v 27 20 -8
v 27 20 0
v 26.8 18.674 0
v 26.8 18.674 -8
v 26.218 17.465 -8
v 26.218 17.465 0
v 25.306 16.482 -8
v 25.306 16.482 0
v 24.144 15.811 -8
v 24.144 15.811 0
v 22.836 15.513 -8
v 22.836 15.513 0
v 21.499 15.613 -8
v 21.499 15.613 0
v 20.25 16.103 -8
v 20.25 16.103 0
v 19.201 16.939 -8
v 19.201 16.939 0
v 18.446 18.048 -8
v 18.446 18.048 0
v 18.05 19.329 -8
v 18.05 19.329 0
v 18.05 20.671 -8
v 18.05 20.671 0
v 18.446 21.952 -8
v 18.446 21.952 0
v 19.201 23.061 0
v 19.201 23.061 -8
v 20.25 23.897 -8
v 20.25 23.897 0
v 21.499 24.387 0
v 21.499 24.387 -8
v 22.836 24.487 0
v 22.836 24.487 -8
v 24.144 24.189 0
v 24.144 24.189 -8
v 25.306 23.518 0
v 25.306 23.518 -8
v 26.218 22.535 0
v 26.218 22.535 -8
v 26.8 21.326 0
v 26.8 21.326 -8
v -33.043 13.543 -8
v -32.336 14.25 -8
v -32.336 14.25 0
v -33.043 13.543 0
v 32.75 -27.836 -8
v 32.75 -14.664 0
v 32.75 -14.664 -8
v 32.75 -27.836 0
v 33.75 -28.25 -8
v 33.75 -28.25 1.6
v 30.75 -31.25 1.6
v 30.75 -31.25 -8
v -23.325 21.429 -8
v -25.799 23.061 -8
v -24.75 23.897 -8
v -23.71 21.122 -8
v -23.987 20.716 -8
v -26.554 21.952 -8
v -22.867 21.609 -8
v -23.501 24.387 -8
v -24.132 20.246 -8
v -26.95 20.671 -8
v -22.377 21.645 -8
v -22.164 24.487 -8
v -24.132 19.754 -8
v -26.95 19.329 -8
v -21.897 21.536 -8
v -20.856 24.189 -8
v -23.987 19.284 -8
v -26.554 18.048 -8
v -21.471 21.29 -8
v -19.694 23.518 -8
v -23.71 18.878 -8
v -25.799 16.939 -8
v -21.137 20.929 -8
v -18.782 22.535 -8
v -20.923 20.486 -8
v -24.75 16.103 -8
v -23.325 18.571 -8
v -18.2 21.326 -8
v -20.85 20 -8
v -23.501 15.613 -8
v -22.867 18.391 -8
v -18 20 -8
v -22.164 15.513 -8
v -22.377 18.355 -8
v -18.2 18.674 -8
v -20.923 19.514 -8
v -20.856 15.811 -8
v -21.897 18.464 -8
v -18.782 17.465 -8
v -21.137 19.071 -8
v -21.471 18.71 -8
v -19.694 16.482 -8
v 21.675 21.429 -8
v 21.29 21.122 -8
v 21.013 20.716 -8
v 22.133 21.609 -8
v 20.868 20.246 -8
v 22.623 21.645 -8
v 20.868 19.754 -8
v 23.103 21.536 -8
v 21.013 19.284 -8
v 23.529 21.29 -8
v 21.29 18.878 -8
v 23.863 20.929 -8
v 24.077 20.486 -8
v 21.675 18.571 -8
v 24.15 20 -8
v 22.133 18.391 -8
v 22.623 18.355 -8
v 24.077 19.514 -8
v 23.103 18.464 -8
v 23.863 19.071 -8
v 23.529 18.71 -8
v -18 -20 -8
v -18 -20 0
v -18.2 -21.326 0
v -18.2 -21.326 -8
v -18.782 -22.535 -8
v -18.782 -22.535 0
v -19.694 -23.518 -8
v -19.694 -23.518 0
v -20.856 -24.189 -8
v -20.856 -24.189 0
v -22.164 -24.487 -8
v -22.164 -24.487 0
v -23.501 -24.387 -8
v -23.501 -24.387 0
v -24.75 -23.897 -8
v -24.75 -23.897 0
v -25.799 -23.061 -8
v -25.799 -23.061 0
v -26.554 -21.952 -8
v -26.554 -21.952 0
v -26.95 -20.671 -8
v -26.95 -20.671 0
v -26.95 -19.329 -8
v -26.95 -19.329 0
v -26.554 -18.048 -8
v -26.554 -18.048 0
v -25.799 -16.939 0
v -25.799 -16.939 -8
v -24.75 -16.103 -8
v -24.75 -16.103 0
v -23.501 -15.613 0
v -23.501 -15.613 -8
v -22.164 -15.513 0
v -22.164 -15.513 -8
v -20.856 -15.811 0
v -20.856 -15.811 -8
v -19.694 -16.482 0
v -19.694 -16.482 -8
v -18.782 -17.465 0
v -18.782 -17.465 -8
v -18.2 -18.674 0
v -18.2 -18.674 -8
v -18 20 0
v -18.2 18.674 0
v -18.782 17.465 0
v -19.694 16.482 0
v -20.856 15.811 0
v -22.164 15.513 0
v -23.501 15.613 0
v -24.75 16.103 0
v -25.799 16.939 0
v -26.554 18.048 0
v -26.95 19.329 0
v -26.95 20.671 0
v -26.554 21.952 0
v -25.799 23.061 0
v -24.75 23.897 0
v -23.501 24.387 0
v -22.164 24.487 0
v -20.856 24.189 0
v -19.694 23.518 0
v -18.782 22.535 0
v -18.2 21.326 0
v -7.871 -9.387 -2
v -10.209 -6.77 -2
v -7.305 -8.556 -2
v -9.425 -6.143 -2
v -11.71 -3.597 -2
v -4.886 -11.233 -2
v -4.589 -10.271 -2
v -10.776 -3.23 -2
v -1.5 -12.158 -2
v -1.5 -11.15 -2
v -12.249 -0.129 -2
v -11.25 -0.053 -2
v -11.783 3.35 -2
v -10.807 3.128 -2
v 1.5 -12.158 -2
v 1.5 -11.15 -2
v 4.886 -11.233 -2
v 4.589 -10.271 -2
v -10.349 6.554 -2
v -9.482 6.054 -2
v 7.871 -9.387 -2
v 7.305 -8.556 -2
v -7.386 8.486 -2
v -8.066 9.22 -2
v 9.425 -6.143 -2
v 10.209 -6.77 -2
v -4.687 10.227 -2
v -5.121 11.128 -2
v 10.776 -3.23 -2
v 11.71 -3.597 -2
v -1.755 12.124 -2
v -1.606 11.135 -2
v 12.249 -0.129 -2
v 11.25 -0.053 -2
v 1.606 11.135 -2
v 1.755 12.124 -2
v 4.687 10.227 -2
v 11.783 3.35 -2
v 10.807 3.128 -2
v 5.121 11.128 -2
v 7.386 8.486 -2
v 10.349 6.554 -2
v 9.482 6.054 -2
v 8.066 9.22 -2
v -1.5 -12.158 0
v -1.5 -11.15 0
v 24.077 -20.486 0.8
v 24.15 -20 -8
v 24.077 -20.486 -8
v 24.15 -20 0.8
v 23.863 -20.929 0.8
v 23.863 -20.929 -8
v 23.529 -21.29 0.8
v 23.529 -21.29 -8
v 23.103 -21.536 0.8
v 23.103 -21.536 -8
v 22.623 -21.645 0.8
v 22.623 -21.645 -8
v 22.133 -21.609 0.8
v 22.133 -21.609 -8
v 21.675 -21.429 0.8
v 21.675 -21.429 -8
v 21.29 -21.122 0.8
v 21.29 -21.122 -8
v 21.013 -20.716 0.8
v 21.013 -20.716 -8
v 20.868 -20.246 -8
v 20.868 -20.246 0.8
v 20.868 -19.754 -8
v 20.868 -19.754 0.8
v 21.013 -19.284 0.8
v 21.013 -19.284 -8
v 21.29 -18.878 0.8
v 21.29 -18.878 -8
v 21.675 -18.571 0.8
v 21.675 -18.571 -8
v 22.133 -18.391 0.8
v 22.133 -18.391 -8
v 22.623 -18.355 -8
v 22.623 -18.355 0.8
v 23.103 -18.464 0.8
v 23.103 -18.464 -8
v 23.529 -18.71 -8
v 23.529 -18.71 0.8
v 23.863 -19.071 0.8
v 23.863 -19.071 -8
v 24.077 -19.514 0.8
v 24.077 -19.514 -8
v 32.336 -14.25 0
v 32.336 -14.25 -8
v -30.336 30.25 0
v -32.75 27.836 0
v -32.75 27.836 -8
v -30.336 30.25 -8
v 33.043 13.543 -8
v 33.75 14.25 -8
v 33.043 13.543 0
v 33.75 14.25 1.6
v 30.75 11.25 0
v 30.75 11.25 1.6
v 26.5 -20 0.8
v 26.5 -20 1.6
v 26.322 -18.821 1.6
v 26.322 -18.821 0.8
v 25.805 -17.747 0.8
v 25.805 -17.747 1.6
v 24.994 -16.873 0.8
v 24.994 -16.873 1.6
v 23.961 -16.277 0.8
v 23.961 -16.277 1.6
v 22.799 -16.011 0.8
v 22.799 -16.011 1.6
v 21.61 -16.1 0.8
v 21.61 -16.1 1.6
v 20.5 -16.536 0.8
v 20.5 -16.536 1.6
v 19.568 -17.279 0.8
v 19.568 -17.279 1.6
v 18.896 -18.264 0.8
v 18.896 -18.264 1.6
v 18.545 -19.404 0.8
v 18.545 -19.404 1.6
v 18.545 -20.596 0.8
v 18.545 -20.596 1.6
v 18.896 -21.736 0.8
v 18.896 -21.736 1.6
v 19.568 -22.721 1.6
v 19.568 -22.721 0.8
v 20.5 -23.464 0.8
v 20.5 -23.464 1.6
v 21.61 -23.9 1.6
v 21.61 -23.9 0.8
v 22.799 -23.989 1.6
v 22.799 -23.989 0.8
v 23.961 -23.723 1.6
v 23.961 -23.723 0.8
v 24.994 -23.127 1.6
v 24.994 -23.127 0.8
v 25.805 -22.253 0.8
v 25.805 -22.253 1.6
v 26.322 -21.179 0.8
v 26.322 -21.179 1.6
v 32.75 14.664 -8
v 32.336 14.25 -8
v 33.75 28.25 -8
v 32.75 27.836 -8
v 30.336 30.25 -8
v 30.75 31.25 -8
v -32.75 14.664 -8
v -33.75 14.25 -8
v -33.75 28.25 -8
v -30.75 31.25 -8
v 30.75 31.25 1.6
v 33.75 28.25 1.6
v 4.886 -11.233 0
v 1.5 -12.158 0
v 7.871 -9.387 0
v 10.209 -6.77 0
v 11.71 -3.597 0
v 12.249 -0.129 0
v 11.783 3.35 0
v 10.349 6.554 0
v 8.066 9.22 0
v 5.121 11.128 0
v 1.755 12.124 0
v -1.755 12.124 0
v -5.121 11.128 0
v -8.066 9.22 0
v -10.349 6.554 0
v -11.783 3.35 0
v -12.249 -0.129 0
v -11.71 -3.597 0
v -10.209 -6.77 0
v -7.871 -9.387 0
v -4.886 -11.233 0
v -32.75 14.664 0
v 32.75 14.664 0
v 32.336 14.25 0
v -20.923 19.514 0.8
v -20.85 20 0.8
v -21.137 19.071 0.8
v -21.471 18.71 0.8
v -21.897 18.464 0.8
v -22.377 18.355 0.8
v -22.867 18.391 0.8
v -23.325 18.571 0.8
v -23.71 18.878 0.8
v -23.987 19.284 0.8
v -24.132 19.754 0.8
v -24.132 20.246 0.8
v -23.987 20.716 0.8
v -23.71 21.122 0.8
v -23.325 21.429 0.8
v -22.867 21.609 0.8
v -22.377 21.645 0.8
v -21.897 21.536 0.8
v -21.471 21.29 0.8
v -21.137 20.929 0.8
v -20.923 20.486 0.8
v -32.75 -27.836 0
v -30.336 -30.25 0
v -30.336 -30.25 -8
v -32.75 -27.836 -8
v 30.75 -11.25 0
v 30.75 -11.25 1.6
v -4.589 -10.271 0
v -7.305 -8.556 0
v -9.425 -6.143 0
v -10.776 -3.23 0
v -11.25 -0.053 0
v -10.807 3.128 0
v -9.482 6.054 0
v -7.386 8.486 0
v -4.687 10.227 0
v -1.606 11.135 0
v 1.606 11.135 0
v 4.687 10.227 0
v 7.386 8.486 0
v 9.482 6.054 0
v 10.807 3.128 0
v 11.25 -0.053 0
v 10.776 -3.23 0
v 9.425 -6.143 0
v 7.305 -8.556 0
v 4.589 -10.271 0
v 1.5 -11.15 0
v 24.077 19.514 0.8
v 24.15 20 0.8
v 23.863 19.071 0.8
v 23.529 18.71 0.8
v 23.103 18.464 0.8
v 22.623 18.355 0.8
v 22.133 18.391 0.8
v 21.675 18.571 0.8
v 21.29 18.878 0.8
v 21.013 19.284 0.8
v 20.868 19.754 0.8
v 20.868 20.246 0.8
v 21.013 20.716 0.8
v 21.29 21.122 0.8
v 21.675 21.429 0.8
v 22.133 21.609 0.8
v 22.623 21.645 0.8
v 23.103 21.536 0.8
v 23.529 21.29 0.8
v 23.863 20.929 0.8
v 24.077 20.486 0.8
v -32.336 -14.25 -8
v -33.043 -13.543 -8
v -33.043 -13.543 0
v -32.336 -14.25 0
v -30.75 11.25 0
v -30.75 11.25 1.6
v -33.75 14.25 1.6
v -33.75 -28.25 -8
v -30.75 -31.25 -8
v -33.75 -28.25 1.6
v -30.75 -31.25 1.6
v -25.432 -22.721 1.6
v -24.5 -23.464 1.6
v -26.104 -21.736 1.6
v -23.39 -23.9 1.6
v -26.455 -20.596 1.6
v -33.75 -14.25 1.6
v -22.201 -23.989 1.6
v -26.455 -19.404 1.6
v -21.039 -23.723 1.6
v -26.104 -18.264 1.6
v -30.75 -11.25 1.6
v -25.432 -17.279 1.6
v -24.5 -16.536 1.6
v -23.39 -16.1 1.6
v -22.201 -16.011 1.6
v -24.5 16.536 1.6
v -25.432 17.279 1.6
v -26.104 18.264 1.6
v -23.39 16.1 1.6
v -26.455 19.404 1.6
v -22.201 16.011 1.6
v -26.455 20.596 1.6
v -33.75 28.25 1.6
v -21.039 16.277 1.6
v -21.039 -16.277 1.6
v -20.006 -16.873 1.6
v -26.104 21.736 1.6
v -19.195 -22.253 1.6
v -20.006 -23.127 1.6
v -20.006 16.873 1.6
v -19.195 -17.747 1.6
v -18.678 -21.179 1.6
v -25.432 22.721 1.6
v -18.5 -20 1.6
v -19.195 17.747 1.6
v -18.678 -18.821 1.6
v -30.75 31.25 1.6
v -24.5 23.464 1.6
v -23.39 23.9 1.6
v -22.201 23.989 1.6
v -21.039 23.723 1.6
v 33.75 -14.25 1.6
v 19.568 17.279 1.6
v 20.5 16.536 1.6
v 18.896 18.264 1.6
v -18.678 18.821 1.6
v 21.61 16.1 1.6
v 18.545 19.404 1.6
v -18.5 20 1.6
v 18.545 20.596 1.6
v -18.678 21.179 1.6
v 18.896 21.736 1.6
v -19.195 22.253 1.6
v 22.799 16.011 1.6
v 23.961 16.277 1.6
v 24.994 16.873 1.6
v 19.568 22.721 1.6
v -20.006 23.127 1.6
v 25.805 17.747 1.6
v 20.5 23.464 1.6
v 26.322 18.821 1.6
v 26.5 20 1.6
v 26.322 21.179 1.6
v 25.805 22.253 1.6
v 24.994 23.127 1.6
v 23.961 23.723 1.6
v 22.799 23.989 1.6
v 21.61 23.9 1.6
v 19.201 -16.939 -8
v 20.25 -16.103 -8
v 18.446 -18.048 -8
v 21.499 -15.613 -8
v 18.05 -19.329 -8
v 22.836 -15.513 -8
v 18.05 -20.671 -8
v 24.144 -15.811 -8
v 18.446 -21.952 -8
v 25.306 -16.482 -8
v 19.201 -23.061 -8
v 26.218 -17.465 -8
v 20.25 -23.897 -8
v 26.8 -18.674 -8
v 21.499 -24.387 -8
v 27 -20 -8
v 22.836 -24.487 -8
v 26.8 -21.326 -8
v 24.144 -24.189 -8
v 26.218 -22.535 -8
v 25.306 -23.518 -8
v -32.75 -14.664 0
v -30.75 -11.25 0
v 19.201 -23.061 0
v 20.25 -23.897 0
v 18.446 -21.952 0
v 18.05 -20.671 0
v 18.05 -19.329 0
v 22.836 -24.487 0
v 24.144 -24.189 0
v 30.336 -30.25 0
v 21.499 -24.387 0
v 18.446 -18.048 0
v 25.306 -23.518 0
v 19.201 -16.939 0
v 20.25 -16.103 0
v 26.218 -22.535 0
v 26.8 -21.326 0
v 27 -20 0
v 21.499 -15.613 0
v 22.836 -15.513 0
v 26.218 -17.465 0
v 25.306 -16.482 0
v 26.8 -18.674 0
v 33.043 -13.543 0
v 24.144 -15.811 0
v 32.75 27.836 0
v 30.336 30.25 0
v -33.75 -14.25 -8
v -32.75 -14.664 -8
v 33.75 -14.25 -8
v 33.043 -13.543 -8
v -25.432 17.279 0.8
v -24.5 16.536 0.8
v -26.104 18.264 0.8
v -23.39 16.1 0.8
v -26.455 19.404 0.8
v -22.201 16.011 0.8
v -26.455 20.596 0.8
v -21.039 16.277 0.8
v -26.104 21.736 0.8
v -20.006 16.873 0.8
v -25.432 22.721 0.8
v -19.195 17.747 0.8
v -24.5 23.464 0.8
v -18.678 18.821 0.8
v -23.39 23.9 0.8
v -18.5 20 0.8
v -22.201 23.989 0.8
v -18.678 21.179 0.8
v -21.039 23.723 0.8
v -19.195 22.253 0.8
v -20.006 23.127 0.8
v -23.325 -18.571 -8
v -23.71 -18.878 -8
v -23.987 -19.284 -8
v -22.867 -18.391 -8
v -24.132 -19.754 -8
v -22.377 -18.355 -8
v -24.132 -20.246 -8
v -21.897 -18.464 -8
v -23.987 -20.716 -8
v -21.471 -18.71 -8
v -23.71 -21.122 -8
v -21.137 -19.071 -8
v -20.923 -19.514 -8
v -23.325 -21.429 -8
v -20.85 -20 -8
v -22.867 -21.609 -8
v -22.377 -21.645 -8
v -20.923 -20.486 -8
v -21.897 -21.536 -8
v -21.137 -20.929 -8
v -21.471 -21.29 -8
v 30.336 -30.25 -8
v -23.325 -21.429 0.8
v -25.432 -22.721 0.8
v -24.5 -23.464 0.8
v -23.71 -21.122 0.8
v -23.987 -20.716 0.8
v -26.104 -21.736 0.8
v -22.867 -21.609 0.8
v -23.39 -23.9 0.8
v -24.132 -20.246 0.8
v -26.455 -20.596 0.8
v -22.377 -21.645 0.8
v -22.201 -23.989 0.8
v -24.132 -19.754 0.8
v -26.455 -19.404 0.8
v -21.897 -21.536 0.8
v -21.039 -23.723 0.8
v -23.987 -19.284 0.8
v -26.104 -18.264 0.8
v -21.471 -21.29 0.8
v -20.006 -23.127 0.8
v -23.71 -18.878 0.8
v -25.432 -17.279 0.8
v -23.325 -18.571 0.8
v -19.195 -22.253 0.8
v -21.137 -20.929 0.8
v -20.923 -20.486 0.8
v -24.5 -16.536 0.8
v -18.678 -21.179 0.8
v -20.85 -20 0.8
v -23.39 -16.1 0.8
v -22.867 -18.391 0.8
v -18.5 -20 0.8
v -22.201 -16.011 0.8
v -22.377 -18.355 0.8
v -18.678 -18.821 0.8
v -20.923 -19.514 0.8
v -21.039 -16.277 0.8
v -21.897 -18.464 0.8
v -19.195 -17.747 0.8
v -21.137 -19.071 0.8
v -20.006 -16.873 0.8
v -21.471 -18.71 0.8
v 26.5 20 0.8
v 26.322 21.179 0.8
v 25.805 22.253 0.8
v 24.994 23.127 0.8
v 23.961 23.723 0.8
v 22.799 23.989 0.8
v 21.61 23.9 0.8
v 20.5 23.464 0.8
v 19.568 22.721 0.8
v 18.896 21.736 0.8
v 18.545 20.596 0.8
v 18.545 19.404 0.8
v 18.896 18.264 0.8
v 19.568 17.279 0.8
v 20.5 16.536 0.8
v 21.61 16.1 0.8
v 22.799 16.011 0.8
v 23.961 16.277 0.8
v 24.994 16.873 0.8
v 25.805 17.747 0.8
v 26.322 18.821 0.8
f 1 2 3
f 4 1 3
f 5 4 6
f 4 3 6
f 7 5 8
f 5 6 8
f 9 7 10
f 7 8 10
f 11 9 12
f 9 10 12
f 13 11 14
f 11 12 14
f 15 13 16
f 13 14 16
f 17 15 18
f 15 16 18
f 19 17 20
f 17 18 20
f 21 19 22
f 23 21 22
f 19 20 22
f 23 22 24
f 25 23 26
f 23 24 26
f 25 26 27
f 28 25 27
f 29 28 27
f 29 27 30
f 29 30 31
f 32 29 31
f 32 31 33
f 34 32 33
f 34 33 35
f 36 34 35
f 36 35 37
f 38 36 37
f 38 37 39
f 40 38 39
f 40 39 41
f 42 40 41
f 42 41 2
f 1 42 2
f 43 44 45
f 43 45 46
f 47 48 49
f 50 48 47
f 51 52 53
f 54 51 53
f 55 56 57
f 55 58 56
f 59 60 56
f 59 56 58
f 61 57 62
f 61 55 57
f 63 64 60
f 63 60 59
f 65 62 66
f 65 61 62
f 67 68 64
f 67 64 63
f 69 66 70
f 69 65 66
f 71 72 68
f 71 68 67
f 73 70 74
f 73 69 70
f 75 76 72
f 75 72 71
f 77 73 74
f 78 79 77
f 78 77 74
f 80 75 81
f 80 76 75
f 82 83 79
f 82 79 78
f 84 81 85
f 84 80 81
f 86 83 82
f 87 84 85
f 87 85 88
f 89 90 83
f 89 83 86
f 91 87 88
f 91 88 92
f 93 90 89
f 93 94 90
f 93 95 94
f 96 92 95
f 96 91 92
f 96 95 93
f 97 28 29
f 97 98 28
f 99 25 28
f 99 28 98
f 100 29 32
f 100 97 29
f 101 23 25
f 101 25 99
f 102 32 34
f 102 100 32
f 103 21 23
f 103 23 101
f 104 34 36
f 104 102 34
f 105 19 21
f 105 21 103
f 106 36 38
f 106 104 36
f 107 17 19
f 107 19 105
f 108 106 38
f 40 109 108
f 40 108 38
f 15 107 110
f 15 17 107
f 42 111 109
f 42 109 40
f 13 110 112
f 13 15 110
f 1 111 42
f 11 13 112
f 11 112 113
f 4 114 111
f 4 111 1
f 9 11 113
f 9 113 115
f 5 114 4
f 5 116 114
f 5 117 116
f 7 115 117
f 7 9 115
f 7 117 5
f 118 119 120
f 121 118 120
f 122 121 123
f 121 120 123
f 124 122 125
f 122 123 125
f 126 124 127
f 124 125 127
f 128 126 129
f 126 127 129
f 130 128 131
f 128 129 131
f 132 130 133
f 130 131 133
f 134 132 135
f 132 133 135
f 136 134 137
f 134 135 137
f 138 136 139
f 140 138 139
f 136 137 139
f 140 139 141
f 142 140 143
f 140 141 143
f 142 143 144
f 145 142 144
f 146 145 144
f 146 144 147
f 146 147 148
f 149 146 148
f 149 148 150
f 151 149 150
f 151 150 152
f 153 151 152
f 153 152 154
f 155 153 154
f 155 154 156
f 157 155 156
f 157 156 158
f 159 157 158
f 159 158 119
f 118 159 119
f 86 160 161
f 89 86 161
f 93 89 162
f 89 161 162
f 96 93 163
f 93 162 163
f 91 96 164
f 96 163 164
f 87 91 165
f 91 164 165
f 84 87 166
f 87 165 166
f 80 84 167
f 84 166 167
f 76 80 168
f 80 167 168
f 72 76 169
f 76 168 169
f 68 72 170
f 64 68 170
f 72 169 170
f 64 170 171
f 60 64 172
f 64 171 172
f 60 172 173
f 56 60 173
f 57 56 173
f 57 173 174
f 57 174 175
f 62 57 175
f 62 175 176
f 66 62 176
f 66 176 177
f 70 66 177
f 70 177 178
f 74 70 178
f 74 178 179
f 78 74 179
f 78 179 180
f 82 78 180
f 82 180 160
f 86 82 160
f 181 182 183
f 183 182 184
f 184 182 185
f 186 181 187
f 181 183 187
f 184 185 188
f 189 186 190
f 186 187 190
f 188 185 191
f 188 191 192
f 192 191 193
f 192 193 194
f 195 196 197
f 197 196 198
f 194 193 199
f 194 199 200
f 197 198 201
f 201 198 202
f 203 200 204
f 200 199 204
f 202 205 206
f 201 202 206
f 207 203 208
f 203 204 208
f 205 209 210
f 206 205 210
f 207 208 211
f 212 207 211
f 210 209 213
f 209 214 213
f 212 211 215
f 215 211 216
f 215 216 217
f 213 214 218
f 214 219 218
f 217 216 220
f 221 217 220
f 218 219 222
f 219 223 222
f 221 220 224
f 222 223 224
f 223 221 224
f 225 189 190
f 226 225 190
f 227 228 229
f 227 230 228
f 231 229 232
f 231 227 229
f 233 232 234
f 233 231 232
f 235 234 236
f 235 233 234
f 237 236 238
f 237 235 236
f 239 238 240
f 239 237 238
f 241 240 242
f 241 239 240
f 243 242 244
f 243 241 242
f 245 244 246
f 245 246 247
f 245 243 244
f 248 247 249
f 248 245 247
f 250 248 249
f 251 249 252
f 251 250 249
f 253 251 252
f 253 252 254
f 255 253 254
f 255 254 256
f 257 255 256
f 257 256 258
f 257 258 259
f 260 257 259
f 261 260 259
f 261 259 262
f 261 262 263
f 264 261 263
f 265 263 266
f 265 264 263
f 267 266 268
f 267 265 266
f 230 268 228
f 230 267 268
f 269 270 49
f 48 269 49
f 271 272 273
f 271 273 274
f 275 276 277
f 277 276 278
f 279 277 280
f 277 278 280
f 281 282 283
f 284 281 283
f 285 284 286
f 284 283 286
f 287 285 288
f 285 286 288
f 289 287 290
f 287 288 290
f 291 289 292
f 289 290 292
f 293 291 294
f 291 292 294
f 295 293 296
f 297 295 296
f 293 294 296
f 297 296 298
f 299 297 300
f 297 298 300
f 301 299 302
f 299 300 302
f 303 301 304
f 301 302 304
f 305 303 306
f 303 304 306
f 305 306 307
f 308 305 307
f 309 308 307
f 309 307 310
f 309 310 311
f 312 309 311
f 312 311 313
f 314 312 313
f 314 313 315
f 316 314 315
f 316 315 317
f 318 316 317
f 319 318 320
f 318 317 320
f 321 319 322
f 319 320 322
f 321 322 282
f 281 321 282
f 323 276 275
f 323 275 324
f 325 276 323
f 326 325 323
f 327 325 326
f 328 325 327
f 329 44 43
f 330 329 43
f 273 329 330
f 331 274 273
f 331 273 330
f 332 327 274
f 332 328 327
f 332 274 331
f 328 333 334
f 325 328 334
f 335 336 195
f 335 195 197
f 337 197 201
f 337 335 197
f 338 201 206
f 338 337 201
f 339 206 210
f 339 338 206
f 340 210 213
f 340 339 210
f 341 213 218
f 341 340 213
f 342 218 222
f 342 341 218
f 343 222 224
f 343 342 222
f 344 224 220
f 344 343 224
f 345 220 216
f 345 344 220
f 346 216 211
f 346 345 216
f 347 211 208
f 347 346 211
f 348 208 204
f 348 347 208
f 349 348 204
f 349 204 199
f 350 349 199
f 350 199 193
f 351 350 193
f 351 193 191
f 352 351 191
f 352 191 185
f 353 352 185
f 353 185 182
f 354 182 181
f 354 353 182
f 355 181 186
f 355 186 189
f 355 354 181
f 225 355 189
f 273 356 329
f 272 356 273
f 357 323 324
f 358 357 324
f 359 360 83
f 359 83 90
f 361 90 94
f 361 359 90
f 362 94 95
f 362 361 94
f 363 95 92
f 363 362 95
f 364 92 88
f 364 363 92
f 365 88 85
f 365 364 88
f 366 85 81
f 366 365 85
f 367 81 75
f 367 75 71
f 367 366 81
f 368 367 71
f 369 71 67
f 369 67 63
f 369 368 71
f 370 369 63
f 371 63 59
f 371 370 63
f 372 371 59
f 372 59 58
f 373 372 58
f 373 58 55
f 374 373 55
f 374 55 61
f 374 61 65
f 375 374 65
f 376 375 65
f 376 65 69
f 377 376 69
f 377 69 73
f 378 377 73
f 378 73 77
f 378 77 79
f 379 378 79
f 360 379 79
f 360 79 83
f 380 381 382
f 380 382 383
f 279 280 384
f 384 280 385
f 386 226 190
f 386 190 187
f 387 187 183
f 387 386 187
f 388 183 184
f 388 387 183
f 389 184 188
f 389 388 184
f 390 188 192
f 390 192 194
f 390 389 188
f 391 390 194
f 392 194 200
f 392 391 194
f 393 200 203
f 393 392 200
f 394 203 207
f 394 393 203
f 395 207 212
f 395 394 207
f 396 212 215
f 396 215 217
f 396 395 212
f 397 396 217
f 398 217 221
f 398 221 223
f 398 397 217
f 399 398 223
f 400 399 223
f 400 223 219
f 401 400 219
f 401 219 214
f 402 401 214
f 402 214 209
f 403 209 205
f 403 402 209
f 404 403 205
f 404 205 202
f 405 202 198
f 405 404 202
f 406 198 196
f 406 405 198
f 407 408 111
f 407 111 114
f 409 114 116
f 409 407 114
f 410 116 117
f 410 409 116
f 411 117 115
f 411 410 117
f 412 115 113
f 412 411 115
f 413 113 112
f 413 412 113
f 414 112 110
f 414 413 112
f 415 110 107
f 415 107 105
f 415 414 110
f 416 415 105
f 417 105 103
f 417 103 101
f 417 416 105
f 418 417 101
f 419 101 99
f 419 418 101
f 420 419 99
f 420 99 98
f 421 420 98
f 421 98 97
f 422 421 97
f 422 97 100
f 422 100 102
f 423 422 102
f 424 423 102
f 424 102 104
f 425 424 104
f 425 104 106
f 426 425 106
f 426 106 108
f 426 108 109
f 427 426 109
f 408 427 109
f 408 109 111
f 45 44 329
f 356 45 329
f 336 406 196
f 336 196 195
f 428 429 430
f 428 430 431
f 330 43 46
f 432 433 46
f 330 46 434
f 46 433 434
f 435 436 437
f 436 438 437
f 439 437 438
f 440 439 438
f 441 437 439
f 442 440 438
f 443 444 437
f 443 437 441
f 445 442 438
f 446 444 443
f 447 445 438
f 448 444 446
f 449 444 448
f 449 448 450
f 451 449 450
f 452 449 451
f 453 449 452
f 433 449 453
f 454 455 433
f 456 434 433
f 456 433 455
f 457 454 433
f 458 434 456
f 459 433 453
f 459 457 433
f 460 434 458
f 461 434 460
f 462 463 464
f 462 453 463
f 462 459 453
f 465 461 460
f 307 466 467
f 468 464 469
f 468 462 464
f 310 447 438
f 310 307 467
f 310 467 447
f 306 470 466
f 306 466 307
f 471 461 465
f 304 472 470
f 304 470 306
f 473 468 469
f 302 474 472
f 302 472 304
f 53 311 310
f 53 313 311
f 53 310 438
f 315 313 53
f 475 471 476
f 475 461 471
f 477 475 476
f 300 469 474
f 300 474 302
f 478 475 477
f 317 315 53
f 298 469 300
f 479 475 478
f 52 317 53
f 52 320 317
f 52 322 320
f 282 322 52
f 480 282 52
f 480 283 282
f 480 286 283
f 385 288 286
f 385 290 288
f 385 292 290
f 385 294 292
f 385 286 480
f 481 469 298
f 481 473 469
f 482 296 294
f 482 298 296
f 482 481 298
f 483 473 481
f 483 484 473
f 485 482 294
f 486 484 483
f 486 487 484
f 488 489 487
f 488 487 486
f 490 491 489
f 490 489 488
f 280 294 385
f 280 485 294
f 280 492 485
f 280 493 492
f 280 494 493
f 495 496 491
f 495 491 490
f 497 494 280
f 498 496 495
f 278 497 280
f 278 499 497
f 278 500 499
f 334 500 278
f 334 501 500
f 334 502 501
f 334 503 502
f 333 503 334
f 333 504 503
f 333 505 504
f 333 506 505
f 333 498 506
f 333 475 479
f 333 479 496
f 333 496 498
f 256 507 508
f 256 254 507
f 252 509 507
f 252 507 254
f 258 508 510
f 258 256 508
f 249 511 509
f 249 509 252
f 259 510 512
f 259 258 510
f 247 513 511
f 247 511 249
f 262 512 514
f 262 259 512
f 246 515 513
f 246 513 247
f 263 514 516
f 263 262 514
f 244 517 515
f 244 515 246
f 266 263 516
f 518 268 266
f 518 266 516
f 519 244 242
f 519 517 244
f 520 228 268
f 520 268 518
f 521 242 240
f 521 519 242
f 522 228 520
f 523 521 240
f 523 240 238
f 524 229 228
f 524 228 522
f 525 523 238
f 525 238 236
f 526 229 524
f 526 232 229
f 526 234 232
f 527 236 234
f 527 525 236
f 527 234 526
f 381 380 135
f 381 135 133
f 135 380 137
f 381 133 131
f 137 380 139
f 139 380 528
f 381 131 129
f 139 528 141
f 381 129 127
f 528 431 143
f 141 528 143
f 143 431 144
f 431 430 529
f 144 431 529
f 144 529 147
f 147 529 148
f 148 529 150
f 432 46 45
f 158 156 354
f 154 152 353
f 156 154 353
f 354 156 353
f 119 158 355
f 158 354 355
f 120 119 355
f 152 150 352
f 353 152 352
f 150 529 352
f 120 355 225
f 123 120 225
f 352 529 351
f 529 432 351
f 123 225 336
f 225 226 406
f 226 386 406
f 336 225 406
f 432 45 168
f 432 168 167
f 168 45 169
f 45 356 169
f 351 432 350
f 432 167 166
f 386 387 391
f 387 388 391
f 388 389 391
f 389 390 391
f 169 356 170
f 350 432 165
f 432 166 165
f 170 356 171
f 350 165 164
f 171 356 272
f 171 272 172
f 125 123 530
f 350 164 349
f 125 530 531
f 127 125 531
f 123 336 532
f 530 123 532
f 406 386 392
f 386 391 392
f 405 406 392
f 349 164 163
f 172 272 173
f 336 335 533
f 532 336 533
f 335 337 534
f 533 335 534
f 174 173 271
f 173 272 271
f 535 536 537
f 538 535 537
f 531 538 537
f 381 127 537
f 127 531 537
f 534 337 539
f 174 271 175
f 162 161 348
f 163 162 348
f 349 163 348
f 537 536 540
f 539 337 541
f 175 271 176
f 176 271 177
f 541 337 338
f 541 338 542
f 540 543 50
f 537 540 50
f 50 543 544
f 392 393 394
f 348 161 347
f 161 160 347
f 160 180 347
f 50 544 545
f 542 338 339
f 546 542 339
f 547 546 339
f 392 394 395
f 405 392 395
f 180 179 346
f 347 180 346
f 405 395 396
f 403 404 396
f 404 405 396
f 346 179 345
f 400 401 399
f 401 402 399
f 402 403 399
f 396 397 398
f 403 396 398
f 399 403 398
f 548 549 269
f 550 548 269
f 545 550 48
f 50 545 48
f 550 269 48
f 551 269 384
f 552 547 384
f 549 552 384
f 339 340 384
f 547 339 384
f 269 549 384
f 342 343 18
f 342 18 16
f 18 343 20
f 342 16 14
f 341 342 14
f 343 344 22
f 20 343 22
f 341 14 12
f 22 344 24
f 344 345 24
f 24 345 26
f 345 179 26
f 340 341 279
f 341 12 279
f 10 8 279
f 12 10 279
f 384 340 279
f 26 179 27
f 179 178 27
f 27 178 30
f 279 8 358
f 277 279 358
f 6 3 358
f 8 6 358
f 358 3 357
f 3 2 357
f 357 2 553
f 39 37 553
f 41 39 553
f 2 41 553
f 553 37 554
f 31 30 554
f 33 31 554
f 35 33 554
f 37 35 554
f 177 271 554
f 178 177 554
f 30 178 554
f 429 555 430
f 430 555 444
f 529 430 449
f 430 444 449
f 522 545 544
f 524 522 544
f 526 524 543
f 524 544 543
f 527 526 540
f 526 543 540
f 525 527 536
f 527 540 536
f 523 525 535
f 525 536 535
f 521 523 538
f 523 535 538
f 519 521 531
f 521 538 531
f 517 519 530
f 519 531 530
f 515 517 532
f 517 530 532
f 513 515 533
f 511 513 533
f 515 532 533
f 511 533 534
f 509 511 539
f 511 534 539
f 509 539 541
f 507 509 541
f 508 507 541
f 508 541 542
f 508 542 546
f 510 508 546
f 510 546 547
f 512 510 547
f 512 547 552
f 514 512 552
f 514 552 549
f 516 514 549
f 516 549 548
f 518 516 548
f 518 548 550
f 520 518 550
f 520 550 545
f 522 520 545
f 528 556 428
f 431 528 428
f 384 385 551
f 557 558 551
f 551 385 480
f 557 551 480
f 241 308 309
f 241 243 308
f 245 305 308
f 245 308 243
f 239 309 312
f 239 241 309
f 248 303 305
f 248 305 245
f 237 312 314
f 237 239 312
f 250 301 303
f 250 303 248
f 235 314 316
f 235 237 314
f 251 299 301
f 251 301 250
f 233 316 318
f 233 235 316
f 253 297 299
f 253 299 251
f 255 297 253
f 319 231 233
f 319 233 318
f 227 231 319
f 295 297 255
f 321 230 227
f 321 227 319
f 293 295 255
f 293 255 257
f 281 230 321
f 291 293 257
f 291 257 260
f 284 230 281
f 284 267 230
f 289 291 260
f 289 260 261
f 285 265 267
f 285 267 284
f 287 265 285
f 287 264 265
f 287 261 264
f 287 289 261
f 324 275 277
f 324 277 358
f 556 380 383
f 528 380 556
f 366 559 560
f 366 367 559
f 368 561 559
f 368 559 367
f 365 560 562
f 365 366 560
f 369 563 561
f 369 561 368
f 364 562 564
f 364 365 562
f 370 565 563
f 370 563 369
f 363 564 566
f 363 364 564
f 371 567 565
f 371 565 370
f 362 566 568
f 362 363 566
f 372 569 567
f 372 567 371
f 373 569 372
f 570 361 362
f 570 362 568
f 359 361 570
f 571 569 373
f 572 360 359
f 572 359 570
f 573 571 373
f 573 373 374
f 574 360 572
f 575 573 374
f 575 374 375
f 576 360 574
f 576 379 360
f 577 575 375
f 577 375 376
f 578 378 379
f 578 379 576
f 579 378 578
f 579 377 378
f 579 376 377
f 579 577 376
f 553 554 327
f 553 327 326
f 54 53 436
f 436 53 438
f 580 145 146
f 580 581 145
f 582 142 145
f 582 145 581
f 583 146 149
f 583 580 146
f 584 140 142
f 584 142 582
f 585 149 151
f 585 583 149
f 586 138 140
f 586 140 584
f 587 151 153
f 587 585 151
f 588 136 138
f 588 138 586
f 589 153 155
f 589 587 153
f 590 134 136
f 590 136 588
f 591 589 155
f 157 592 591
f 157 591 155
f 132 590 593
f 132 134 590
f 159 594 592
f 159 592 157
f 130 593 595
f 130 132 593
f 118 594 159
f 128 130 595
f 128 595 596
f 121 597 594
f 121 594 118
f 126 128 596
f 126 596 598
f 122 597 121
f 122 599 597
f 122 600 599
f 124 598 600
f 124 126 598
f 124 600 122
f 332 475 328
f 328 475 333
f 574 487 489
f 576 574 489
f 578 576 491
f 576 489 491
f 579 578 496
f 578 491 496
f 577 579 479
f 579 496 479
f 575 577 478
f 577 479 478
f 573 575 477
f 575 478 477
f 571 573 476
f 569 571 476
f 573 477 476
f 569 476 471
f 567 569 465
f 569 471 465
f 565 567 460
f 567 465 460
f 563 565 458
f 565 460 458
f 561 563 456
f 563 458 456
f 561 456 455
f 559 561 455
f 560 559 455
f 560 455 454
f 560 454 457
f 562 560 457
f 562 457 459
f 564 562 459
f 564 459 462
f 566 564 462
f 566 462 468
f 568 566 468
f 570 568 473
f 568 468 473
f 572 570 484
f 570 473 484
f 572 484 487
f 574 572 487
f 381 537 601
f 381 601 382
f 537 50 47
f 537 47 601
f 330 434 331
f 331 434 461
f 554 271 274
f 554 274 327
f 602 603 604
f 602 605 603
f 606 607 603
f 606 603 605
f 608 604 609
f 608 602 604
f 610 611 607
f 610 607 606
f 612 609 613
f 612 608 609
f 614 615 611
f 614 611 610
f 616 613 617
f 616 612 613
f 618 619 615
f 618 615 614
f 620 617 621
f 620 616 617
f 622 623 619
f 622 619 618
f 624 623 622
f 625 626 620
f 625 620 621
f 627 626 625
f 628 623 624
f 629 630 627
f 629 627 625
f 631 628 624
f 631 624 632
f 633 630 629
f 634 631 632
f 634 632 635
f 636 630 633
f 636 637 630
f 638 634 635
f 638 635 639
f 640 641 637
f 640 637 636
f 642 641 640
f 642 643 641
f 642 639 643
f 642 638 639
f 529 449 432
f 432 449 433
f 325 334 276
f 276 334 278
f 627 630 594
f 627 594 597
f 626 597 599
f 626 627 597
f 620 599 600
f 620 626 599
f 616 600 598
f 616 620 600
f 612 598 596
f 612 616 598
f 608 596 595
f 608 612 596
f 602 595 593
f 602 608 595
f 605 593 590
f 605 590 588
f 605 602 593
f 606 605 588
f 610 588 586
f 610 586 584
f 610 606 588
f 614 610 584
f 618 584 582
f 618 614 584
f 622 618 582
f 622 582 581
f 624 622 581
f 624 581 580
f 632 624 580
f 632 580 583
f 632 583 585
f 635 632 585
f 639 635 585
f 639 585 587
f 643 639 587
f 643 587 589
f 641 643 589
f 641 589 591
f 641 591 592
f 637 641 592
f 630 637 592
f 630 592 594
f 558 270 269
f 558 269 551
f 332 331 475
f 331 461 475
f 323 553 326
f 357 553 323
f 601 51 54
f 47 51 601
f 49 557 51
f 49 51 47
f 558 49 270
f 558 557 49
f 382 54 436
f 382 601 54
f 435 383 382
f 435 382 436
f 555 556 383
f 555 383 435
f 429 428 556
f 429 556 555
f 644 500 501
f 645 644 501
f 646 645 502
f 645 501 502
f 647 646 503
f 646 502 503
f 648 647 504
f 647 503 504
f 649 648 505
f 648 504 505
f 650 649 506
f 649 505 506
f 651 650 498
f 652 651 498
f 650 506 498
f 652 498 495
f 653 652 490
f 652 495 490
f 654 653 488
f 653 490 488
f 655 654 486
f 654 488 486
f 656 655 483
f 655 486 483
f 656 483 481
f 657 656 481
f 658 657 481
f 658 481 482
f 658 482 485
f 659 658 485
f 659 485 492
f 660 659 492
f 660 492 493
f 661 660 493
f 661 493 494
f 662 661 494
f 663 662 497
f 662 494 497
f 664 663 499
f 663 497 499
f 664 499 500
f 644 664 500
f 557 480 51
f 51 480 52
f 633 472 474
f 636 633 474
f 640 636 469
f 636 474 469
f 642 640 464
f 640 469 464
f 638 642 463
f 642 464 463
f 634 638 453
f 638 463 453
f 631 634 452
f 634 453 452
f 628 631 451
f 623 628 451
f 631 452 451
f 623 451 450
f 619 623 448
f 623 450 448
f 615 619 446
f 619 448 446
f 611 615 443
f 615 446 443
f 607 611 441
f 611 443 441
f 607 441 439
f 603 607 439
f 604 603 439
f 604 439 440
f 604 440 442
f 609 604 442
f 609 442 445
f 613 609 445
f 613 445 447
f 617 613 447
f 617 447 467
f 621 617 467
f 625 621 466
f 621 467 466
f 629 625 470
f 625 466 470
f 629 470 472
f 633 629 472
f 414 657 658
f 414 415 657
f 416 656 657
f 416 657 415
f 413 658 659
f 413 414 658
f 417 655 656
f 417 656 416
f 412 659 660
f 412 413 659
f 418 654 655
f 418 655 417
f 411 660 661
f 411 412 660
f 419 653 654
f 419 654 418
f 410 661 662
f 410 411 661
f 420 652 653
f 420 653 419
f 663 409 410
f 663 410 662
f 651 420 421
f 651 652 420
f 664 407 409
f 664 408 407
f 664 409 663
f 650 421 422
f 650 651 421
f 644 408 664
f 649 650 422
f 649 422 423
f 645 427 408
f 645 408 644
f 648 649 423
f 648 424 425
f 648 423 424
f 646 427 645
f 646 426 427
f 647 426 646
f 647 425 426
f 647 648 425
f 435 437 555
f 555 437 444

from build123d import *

# Parameters (mm, degrees)
SKETCH_1_W           = 67.5
SKETCH_1_H           = 62.5
EXTRUDE_1_DEPTH      = 1.6
SKETCH_2_R           = 1.65
CUT_EXTRUDE_1_DEPTH  = 10
CHAMFER_1_SIZE       = 3
SKETCH_3_R           = 1.65
EXTRUDE_2_DEPTH      = 4
SKETCH_4_R           = 4
CUT_EXTRUDE_2_DEPTH  = 0.8
SKETCH_5_R           = 4.5
EXTRUDE_3_DEPTH      = 6
EXTRUDE_4_DEPTH      = 8
EXTRUDE_5_DEPTH      = 2
CUT_EXTRUDE_4_DEPTH  = 8
EXTRUDE_6_DEPTH      = 2
EXTRUDE_6_DEPTH_BACK = 2
SKETCH_10_R          = 4.5
SKETCH_10_R_2        = 1.65


with BuildPart() as part:
    # 草图1 → 凸台-拉伸1 (new body)
    with BuildSketch(Plane.XY):
        Rectangle(SKETCH_1_W, SKETCH_1_H)
    extrude(amount=EXTRUDE_1_DEPTH)

    # 草图2 → 切除-拉伸1 (cut)
    with BuildSketch(Plane.XY.offset(1.6)):
        with Locations((-22.5, 20)):
            Circle(SKETCH_2_R)
        with Locations((22.5, 20)):
            Circle(SKETCH_2_R)
        with Locations((22.5, -20)):
            Circle(SKETCH_2_R)
        with Locations((-22.5, -20)):
            Circle(SKETCH_2_R)
        Polygon((-30.75, 11.25), (-30.75, -11.25), (-33.75, -14.25), (-33.75, 14.25), align=None)
        Polygon((30.75, 11.25), (30.75, -11.25), (33.75, -14.25), (33.75, 14.25), align=None)
    extrude(amount=-CUT_EXTRUDE_1_DEPTH, mode=Mode.SUBTRACT)

    # 倒角1
    chamfer_1_edges = [part.edges().sort_by_distance(p)[0] for p in [
        (33.75, -31.25, 0.8),
        (-33.75, -31.25, 0.8),
        (-33.75, 31.25, 0.8),
        (33.75, 31.25, 0.8),
    ]]
    chamfer(chamfer_1_edges, length=CHAMFER_1_SIZE)

    # 草图3 → 凸台-拉伸2 (add)
    # profile 1 of 4: a face of its own
    with BuildSketch(Plane(origin=(0, 0, 0), x_dir=(-1, 0, 0), z_dir=(0, 0, -1))):
        Polygon((-19.901923789, 20), (-21.200961894, 22.25), (-23.799038106, 22.25), (-25.098076211, 20), (-23.799038106, 17.75), (-21.200961894, 17.75), align=None)
        with Locations(Location((-22.5, 20, 0), (0, 0, 180))):
            Circle(SKETCH_3_R, mode=Mode.SUBTRACT)
    # profile 2 of 4: a face of its own
    with BuildSketch(Plane(origin=(0, 0, 0), x_dir=(-1, 0, 0), z_dir=(0, 0, -1))):
        Polygon((25.098076211, 20), (23.799038106, 22.25), (21.200961894, 22.25), (19.901923789, 20), (21.200961894, 17.75), (23.799038106, 17.75), align=None)
        with Locations(Location((22.5, 20, 0), (0, 0, 180))):
            Circle(SKETCH_3_R, mode=Mode.SUBTRACT)
    # profile 3 of 4: a face of its own
    with BuildSketch(Plane(origin=(0, 0, 0), x_dir=(-1, 0, 0), z_dir=(0, 0, -1))):
        Polygon((25.098076211, -20), (23.799038106, -17.75), (21.200961894, -17.75), (19.901923789, -20), (21.200961894, -22.25), (23.799038106, -22.25), align=None)
        with Locations(Location((22.5, -20, 0), (0, 0, 180))):
            Circle(SKETCH_3_R, mode=Mode.SUBTRACT)
    # profile 4 of 4: a face of its own
    with BuildSketch(Plane(origin=(0, 0, 0), x_dir=(-1, 0, 0), z_dir=(0, 0, -1))):
        Polygon((-19.901923789, -20), (-21.200961894, -17.75), (-23.799038106, -17.75), (-25.098076211, -20), (-23.799038106, -22.25), (-21.200961894, -22.25), align=None)
        with Locations(Location((-22.5, -20, 0), (0, 0, 180))):
            Circle(SKETCH_3_R, mode=Mode.SUBTRACT)
    extrude(amount=EXTRUDE_2_DEPTH)

    # 草图4 → 切除-拉伸2 (cut)
    with BuildSketch(Plane.XY.offset(1.6)):
        with Locations((-22.5, 20)):
            Circle(SKETCH_4_R)
        with Locations((22.5, 20)):
            Circle(SKETCH_4_R)
        with Locations((22.5, -20)):
            Circle(SKETCH_4_R)
        with Locations((-22.5, -20)):
            Circle(SKETCH_4_R)
    extrude(amount=-CUT_EXTRUDE_2_DEPTH, mode=Mode.SUBTRACT)

    # 草图5 → 凸台-拉伸3 (add)
    # profile 1 of 4: a face of its own
    with BuildSketch(Plane(origin=(0, 0, 0), x_dir=(-1, 0, 0), z_dir=(0, 0, -1))):
        with Locations(Location((-22.5, 20, 0), (0, 0, 180))):
            Circle(SKETCH_5_R)
        Polygon((-21.200961894, 17.75), (-19.901923789, 20), (-21.200961894, 22.25), (-23.799038106, 22.25), (-25.098076211, 20), (-23.799038106, 17.75), align=None, mode=Mode.SUBTRACT)
    # profile 2 of 4: a face of its own
    with BuildSketch(Plane(origin=(0, 0, 0), x_dir=(-1, 0, 0), z_dir=(0, 0, -1))):
        with Locations(Location((22.5, 20, 0), (0, 0, 180))):
            Circle(SKETCH_5_R)
        Polygon((23.799038106, 17.75), (25.098076211, 20), (23.799038106, 22.25), (21.200961894, 22.25), (19.901923789, 20), (21.200961894, 17.75), align=None, mode=Mode.SUBTRACT)
    # profile 3 of 4: a face of its own
    with BuildSketch(Plane(origin=(0, 0, 0), x_dir=(-1, 0, 0), z_dir=(0, 0, -1))):
        with Locations(Location((22.5, -20, 0), (0, 0, 180))):
            Circle(SKETCH_5_R)
        Polygon((23.799038106, -22.25), (25.098076211, -20), (23.799038106, -17.75), (21.200961894, -17.75), (19.901923789, -20), (21.200961894, -22.25), align=None, mode=Mode.SUBTRACT)
    # profile 4 of 4: a face of its own
    with BuildSketch(Plane(origin=(0, 0, 0), x_dir=(-1, 0, 0), z_dir=(0, 0, -1))):
        with Locations(Location((-22.5, -20, 0), (0, 0, 180))):
            Circle(SKETCH_5_R)
        Polygon((-21.200961894, -22.25), (-19.901923789, -20), (-21.200961894, -17.75), (-23.799038106, -17.75), (-25.098076211, -20), (-23.799038106, -22.25), align=None, mode=Mode.SUBTRACT)
    extrude(amount=EXTRUDE_3_DEPTH)

    # 草图6 → 凸台-拉伸4 (add)
    with BuildSketch(Plane(origin=(0, 0, 0), x_dir=(-1, 0, 0), z_dir=(0, 0, -1))):
        Polygon((-30.75, -31.25), (30.75, -31.25), (33.75, -28.25), (33.75, -14.25), (30.75, -11.25), (30.75, 11.25), (33.75, 14.25), (33.75, 28.25), (30.75, 31.25), (-30.75, 31.25), (-33.75, 28.25), (-33.75, 14.25), (-30.75, 11.25), (-30.75, -11.25), (-33.75, -14.25), (-33.75, -28.25), align=None)
        Polygon((-30.335786438, -30.25), (30.335786438, -30.25), (32.75, -27.835786438), (32.75, -14.664213562), (29.75, -11.664213562), (29.75, 11.664213562), (32.75, 14.664213562), (32.75, 27.835786438), (30.335786438, 30.25), (-30.335786438, 30.25), (-32.75, 27.835786438), (-32.75, 14.664213562), (-29.75, 11.664213562), (-29.75, -11.664213562), (-32.75, -14.664213562), (-32.75, -27.835786438), align=None, mode=Mode.SUBTRACT)
    extrude(amount=EXTRUDE_4_DEPTH)

    # 草图8 → 凸台-拉伸5 (add)
    with BuildSketch(Plane(origin=(0, 0, 0), x_dir=(-1, 0, 0), z_dir=(0, 0, -1))):
        with BuildLine():
            Line((-1.5, -11.14955156), (-1.5, -12.157816416))
            ThreePointArc((-1.5, -12.157816416), (0, 12.25), (1.5, -12.157816416))
            Line((1.5, -12.157816416), (1.5, -11.14955156))
            ThreePointArc((1.5, -11.14955156), (0, 11.25), (-1.5, -11.14955156))
        make_face()
    extrude(amount=EXTRUDE_5_DEPTH)

    # 草图9 → 切除-拉伸4 (cut)
    with BuildSketch(Plane(origin=(0, 0, -8), x_dir=(-1, 0, 0), z_dir=(0, 0, -1))):
        Polygon((29.75, 11.664213562), (32.335786438, 14.25), (33.042893219, 13.542893219), (30.75, 11.25), (30.75, -11.25), (33.042893219, -13.542893219), (32.335786438, -14.25), (29.75, -11.664213562), align=None)
        Polygon((-33.042893219, 13.542893219), (-32.335786438, 14.25), (-29.75, 11.664213562), (-29.75, -11.664213562), (-32.335786438, -14.25), (-33.042893219, -13.542893219), (-30.75, -11.25), (-30.75, 11.25), align=None)
    extrude(amount=-CUT_EXTRUDE_4_DEPTH, mode=Mode.SUBTRACT)

    # 草图10 → 凸台-拉伸6 (add, two sides: drawn at the far end of the back side and taken through both)
    # profile 1 of 4: a face of its own
    with BuildSketch(Plane(origin=(0, 0, -6), x_dir=(-1, 0, 0), z_dir=(0, 0, -1)).offset(-EXTRUDE_6_DEPTH_BACK)):
        with Locations(Location((-22.5, -20, 0), (0, 0, 180))):
            Circle(SKETCH_10_R)
        with Locations(Location((-22.5, -20, 0), (0, 0, 180))):
            Circle(SKETCH_10_R_2, mode=Mode.SUBTRACT)
    # profile 2 of 4: a face of its own
    with BuildSketch(Plane(origin=(0, 0, -6), x_dir=(-1, 0, 0), z_dir=(0, 0, -1)).offset(-EXTRUDE_6_DEPTH_BACK)):
        with Locations(Location((22.5, 20, 0), (0, 0, 180))):
            Circle(SKETCH_10_R)
        with Locations(Location((22.5, 20, 0), (0, 0, 180))):
            Circle(SKETCH_10_R_2, mode=Mode.SUBTRACT)
    # profile 3 of 4: a face of its own
    with BuildSketch(Plane(origin=(0, 0, -6), x_dir=(-1, 0, 0), z_dir=(0, 0, -1)).offset(-EXTRUDE_6_DEPTH_BACK)):
        with Locations(Location((-22.5, 20, 0), (0, 0, 180))):
            Circle(SKETCH_10_R)
        with Locations(Location((-22.5, 20, 0), (0, 0, 180))):
            Circle(SKETCH_10_R_2, mode=Mode.SUBTRACT)
    # profile 4 of 4: a face of its own
    with BuildSketch(Plane(origin=(0, 0, -6), x_dir=(-1, 0, 0), z_dir=(0, 0, -1)).offset(-EXTRUDE_6_DEPTH_BACK)):
        with Locations(Location((22.5, -20, 0), (0, 0, 180))):
            Circle(SKETCH_10_R)
        with Locations(Location((22.5, -20, 0), (0, 0, 180))):
            Circle(SKETCH_10_R_2, mode=Mode.SUBTRACT)
    extrude(amount=EXTRUDE_6_DEPTH + EXTRUDE_6_DEPTH_BACK)


solid = part.part
